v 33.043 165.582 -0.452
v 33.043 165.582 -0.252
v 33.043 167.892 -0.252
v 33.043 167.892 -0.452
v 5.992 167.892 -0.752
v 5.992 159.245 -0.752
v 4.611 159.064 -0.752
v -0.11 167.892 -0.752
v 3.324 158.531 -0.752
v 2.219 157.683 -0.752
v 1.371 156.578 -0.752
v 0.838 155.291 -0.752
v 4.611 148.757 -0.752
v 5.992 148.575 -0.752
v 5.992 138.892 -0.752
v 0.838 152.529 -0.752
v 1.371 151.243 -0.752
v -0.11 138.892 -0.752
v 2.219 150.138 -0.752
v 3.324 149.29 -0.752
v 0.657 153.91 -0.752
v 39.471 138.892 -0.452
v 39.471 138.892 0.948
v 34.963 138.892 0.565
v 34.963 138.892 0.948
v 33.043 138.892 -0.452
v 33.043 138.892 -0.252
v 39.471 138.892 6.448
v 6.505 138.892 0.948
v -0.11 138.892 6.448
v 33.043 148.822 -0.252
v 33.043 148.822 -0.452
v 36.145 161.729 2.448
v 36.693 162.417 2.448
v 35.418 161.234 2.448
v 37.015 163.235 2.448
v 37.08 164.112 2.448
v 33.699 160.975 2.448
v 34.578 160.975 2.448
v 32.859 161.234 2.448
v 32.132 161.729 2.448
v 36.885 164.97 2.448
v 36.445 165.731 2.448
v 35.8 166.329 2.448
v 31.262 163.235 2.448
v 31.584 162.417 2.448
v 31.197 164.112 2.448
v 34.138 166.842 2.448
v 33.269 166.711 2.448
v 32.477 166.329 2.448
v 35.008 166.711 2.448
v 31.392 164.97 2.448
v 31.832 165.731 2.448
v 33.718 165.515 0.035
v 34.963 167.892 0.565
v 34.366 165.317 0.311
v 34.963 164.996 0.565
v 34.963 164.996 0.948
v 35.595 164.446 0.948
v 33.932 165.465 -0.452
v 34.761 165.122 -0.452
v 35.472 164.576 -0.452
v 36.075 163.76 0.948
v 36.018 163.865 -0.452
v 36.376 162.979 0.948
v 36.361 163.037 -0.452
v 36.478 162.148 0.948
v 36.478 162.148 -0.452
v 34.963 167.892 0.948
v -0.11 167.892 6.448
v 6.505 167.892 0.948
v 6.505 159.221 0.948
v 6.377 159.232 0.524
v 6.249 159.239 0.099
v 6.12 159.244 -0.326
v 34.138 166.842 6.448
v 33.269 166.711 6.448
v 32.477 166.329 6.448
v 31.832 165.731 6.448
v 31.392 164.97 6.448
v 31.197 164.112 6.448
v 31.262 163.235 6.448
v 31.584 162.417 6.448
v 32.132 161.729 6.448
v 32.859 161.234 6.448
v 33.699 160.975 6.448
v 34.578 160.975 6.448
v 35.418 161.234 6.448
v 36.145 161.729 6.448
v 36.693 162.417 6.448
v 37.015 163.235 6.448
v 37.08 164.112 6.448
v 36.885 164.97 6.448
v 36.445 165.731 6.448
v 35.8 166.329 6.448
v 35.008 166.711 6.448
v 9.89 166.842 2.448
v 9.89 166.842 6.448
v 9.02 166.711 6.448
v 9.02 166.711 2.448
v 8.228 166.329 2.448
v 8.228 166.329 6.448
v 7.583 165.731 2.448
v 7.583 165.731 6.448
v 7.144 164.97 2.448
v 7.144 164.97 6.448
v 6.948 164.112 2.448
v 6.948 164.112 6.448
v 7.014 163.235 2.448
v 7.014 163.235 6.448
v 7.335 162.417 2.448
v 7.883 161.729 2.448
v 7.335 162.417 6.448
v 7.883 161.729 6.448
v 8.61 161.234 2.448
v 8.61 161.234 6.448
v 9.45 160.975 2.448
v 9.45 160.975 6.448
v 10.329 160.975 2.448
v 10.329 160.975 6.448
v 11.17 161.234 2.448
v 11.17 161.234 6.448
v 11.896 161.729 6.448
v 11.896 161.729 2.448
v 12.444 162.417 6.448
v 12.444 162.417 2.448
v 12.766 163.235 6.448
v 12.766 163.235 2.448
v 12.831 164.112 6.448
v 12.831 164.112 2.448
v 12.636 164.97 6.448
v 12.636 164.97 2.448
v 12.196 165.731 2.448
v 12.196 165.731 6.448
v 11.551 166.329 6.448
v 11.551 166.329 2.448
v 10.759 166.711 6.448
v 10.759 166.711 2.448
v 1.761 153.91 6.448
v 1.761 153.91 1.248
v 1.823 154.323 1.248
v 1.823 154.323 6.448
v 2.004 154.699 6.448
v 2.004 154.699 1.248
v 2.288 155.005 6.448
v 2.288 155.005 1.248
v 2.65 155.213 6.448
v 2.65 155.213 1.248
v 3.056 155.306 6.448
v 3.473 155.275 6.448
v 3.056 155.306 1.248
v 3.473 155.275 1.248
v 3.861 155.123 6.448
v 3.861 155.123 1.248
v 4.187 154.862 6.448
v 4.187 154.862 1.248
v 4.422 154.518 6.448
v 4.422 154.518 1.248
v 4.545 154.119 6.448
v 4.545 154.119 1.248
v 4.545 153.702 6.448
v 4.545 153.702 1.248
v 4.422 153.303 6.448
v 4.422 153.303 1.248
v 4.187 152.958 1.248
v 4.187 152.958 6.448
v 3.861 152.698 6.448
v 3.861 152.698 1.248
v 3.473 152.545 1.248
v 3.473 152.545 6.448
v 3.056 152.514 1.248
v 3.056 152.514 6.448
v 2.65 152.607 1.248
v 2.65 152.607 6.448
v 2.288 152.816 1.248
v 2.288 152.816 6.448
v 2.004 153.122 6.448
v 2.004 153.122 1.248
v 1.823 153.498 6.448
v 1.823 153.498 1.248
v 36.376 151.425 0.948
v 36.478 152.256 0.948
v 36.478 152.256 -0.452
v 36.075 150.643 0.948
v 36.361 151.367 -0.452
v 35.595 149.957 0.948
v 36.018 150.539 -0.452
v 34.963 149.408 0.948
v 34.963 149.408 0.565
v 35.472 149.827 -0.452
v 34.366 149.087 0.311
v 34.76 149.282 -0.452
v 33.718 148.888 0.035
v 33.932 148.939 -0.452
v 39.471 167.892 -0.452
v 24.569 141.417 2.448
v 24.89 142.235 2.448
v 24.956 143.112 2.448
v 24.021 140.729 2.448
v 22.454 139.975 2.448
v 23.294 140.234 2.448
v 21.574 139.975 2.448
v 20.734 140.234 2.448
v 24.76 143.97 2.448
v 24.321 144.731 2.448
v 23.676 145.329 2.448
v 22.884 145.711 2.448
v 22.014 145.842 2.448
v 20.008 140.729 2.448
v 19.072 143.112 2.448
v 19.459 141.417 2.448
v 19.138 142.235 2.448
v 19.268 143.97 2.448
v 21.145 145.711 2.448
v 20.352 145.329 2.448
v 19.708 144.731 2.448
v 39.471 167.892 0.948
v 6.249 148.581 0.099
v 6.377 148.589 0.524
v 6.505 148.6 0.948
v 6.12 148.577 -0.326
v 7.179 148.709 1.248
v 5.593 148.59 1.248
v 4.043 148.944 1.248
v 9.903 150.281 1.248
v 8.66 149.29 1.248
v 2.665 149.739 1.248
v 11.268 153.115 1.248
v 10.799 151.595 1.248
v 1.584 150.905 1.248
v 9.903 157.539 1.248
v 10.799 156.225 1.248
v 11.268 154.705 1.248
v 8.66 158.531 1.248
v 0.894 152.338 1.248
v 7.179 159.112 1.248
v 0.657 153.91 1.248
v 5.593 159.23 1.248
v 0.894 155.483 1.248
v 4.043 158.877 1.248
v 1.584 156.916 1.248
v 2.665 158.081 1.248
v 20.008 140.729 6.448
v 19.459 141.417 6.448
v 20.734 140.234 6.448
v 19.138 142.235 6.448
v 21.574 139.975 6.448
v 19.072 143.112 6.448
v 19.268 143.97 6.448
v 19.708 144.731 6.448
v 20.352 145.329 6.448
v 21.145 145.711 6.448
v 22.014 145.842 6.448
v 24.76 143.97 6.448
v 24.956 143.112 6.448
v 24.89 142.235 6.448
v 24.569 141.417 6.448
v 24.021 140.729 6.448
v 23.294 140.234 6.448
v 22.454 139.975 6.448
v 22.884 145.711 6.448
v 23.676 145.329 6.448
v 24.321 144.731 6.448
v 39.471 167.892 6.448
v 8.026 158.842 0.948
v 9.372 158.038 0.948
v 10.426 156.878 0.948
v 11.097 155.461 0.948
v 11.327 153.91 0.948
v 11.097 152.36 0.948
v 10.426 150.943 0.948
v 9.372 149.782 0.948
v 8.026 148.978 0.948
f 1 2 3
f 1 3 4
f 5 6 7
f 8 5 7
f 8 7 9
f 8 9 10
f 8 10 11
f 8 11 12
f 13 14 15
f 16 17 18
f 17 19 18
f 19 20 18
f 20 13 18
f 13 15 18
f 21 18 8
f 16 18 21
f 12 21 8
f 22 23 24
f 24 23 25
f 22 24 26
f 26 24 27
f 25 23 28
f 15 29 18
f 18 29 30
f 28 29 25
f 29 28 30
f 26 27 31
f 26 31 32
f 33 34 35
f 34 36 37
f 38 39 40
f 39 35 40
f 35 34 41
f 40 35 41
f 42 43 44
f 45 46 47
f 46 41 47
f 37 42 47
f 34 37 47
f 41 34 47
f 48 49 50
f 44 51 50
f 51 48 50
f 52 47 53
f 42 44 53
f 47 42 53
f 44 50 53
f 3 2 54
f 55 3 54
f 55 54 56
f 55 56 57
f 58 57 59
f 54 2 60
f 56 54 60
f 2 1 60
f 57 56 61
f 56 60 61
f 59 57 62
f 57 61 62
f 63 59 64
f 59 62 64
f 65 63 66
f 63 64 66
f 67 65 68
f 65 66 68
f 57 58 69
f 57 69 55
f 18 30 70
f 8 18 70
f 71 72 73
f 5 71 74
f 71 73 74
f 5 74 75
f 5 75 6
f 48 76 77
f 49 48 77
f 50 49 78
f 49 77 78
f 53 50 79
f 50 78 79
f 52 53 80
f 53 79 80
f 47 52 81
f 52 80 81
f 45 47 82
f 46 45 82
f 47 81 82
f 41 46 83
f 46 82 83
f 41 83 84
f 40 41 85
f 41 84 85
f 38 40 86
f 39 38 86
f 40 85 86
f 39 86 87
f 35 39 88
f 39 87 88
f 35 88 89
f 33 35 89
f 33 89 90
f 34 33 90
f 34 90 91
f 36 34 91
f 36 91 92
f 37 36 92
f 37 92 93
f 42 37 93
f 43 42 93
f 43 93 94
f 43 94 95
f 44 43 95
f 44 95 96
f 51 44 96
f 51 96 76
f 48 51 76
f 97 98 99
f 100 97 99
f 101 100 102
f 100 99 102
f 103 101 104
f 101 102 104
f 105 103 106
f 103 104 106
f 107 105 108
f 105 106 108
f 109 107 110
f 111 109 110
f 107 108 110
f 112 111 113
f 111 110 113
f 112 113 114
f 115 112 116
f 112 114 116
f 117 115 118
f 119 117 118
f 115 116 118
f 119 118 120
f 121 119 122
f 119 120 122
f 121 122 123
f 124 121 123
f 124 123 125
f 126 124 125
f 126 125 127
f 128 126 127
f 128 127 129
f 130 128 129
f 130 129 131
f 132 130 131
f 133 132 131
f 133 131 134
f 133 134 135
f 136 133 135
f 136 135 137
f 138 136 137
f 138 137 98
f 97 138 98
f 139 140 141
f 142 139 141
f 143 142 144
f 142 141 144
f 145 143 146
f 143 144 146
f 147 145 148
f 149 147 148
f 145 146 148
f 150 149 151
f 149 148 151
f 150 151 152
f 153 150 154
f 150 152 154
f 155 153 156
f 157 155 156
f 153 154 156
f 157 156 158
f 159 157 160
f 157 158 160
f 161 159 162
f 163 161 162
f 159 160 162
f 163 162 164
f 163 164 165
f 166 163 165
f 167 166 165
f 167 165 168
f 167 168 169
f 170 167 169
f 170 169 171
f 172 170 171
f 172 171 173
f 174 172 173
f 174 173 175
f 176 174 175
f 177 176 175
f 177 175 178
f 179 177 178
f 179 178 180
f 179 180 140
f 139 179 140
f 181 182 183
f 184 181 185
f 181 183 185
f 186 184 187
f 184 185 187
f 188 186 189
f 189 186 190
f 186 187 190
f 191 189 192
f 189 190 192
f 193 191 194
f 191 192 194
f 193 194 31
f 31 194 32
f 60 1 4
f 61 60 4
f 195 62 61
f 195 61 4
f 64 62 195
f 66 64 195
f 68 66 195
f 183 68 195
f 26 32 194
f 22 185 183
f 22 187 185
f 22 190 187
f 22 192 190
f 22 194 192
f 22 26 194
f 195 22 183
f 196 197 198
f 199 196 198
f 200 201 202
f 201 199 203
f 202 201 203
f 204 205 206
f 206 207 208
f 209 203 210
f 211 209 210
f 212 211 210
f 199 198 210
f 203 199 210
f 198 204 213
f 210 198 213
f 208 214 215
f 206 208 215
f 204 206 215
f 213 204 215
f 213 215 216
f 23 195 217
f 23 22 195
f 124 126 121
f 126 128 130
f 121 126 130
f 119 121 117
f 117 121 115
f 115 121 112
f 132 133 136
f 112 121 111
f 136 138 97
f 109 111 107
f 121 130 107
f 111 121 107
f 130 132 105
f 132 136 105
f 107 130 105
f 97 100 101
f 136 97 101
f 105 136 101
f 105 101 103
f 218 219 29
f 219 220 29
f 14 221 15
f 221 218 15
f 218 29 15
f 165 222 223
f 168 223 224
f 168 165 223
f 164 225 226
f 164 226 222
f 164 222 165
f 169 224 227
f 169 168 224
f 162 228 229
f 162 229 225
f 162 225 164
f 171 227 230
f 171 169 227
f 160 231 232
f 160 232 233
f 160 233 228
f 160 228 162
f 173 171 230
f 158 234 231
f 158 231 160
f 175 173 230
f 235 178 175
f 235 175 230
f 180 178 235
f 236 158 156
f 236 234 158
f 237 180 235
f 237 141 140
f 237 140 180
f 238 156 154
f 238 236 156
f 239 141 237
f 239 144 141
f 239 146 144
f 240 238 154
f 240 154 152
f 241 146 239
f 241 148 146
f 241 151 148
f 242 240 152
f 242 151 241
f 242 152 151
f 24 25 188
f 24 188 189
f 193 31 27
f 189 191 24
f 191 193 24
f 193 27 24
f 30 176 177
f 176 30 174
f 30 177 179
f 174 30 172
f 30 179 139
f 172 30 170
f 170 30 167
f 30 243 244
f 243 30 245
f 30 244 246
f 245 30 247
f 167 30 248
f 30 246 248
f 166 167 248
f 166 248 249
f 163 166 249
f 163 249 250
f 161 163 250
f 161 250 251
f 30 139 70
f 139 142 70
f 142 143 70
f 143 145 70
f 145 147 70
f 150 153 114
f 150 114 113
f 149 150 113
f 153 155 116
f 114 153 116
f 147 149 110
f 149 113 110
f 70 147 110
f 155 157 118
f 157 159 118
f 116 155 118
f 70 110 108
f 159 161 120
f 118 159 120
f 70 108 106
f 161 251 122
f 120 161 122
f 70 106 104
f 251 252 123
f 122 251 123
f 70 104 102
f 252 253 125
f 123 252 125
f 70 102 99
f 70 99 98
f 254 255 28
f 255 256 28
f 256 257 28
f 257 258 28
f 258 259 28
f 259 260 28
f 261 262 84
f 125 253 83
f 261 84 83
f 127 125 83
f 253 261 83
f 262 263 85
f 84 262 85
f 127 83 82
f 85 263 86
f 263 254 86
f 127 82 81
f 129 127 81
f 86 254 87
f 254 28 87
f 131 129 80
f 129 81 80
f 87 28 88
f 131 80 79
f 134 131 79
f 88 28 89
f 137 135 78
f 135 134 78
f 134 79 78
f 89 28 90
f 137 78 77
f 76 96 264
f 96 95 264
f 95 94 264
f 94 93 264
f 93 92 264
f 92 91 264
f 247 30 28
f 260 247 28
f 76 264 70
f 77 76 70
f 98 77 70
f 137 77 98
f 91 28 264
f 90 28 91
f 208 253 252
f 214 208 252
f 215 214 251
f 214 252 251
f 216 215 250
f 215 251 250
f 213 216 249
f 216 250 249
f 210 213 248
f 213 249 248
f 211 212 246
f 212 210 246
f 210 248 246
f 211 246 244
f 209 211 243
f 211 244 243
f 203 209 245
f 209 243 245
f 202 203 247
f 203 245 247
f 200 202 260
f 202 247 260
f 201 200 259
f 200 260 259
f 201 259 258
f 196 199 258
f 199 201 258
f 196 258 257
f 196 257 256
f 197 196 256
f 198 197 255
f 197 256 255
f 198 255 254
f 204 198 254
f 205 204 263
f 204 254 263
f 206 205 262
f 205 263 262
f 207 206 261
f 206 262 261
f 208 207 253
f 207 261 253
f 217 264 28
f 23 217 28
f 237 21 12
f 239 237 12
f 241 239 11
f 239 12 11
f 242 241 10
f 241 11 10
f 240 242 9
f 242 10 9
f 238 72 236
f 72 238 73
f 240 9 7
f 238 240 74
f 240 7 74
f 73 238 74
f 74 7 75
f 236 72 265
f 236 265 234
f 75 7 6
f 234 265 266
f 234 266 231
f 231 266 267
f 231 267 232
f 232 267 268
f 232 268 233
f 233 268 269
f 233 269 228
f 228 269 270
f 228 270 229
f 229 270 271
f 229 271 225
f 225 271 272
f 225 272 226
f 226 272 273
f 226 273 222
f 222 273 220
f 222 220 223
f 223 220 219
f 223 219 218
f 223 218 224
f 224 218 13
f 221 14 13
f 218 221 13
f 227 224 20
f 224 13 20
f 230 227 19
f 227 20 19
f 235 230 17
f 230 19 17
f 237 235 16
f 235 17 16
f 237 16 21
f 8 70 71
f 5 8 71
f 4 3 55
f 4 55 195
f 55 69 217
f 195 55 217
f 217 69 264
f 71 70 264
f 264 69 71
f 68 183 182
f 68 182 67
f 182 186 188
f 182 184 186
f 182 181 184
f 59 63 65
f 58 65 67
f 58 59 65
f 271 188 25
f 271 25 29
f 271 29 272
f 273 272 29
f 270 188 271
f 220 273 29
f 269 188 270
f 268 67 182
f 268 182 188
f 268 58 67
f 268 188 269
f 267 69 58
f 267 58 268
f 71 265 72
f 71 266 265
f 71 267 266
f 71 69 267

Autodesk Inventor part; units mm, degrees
ref_plane "YZ Plane" through (0, 0, 0) normal (1, 0, 0) x (0, 1, 0)
ref_plane "XZ Plane" through (0, 0, 0) normal (0, 1, 0) x (-1, 0, 0)
ref_plane "XY Plane" through (0, 0, 0) normal (0, 0, 1) x (1, 0, 0)
ref_plane "Work Plane1" through (52.5141, 202.7033, 6.4479) normal (0, 0, -1) x (0, 1, 0)
sketch "Sketch1" plane through (52.5141, 202.7033, 6.4479) normal (0, 0, -1) x (0, 1, 0)
  circle A0 centre (-59.8114, -30.5) radius 1.4 construction
  circle A1 centre (-38.8114, -18.3756) radius 1.4 projected
  circle A2 centre (-38.8114, -42.6244) radius 1.4 construction
  circle A3 centre (41, 0) radius 1.65 projected
  circle A4 centre (-9, 0) radius 1.65 projected
  circle A5 centre (-9, 50) radius 1.65 projected
  circle A6 centre (41, 50) radius 1.65 projected
  circle A7 centre (16, 50) radius 1.65 projected
  circle A8 centre (-9, 25) radius 1.65 projected
  circle A9 centre (16, 0) radius 1.65 projected
  circle A10 centre (41, 25) radius 1.65 projected
  line L0 (80, 55) -> (-80, 55) projected
  line L1 (-80, 55) -> (-80, -55) projected
  line L2 (-80, -55) -> (80, -55) projected
  line L3 (80, -55) -> (80, 55) projected
  line L4 (-36.5, 0) -> (-36.5, -50) projected
  line L5 (-14, 0) -> (-36.5, 0) projected
  line L6 (-14, -5) -> (-14, 0) projected
  line L7 (72, -5) -> (-14, -5) projected
  line L8 (72, -50) -> (72, -5) projected
  line L9 (-36.5, -50) -> (72, -50) projected
  line L10 (-4, 45) -> (-4, 5) projected
  line L11 (36, 45) -> (-4, 45) projected
  line L12 (36, 5) -> (36, 45) projected
  line L13 (-4, 5) -> (36, 5) projected
  line L14 (-64.5989, -17.0433) -> (-64.5989, -57.0433) construction
  line L15 (-64.5989, -57.0433) -> (-34.5989, -57.0433) construction
  line L16 (-34.5989, -57.0433) -> (-34.5989, -17.0433) construction
  line L17 (-34.5989, -17.0433) -> (-64.5989, -17.0433) construction
  line L18 (-34.8114, -13.0433) -> (-63.8114, -13.0433)
  line L19 (-63.8114, -13.0433) -> (-63.8114, -52.6244)
  line L20 (-63.8114, -52.6244) -> (-34.8114, -52.6244)
  line L21 (-34.8114, -52.6244) -> (-34.8114, -13.0433)
  circle A11 centre (-59.8114, -30.5) radius 2.95
  circle A12 centre (-38.8114, -18.3756) radius 2.95
  circle A13 centre (-38.8114, -42.6244) radius 2.95 construction
  line L22 (-36.5, -35.1157) -> (-41.75, -35.1157) construction
  line L23 (-41.75, -35.1157) -> (-41.75, -38.5657) construction
  line L24 (-41.75, -38.5657) -> (-56.86, -38.5657) construction
  line L25 (-56.86, -38.5657) -> (-56.86, -35.1157) construction
  line L26 (-56.86, -35.1157) -> (-60.26, -35.1157) construction
  line L27 (-60.26, -35.1157) -> (-60.26, -52.0657) construction
  line L28 (-60.26, -52.0657) -> (-36.5, -52.0657) construction
  line L29 (-36.5, -52.0657) -> (-36.5, -35.1157) construction
  line L30 (-41.75, -28.3657) -> (-36.5, -28.3657) construction
  line L31 (-36.5, -28.3657) -> (-36.5, -25.0657) construction
  line L32 (-36.5, -25.0657) -> (-60.26, -25.0657) construction
  line L33 (-60.26, -25.0657) -> (-60.26, -28.3657) construction
  line L34 (-60.26, -28.3657) -> (-56.86, -28.3657) construction
  line L35 (-56.86, -28.3657) -> (-56.86, -27.0942) construction
  line L36 (-56.86, -27.0942) -> (-41.75, -27.0942) construction
  line L37 (-41.75, -27.0942) -> (-41.75, -28.3657) construction
  line L38 (-56.86, -35.1157) -> (-60.26, -35.1157) construction
  line L39 (-56.86, -38.5657) -> (-56.86, -35.1157) construction
  line L40 (-41.75, -38.5657) -> (-56.86, -38.5657) construction
  line L41 (-41.75, -35.1157) -> (-41.75, -38.5657) construction
  line L42 (-36.5, -35.1157) -> (-41.75, -35.1157) construction
  line L43 (-36.5, -35.05) -> (-36.5, -35.1157) construction
  line L44 (-36.5, -35.05) -> (-56.86, -35.05) construction
  line L45 (-36.5, -34.78) -> (-36.5, -35.05) construction
  line L46 (-36.5, -34.78) -> (-56.86, -34.78) construction
  line L47 (-36.5, -34.51) -> (-36.5, -34.78) construction
  line L48 (-36.5, -34.51) -> (-56.86, -34.51) construction
  line L49 (-36.5, -34.24) -> (-36.5, -34.51) construction
  line L50 (-36.5, -34.24) -> (-56.86, -34.24) construction
  line L51 (-36.5, -33.97) -> (-36.5, -34.24) construction
  line L52 (-36.5, -33.97) -> (-56.86, -33.97) construction
  line L53 (-36.5, -33.7) -> (-36.5, -33.97) construction
  line L54 (-36.5, -33.7) -> (-56.86, -33.7) construction
  line L55 (-36.5, -33.43) -> (-36.5, -33.7) construction
  line L56 (-36.5, -33.43) -> (-56.86, -33.43) construction
  line L57 (-36.5, -33.16) -> (-36.5, -33.43) construction
  line L58 (-36.5, -33.16) -> (-56.86, -33.16) construction
  line L59 (-36.5, -32.89) -> (-36.5, -33.16) construction
  line L60 (-36.5, -32.89) -> (-56.86, -32.89) construction
  line L61 (-36.5, -32.62) -> (-36.5, -32.89) construction
  line L62 (-36.5, -32.62) -> (-56.86, -32.62) construction
  line L63 (-36.5, -32.35) -> (-36.5, -32.62) construction
  line L64 (-36.5, -32.35) -> (-56.86, -32.35) construction
  line L65 (-36.5, -32.08) -> (-36.5, -32.35) construction
  line L66 (-36.5, -32.08) -> (-56.86, -32.08) construction
  line L67 (-36.5, -31.81) -> (-36.5, -32.08) construction
  line L68 (-36.5, -31.81) -> (-56.86, -31.81) construction
  line L69 (-36.5, -31.54) -> (-36.5, -31.81) construction
  line L70 (-36.5, -31.54) -> (-56.86, -31.54) construction
  line L71 (-36.5, -31.27) -> (-36.5, -31.54) construction
  line L72 (-36.5, -31.27) -> (-56.86, -31.27) construction
  line L73 (-36.5, -31) -> (-36.5, -31.27) construction
  line L74 (-36.5, -31) -> (-56.86, -31) construction
  line L75 (-36.5, -30.73) -> (-36.5, -31) construction
  line L76 (-36.5, -30.73) -> (-56.86, -30.73) construction
  line L77 (-36.5, -30.46) -> (-36.5, -30.73) construction
  line L78 (-36.5, -30.46) -> (-56.86, -30.46) construction
  line L79 (-36.5, -30.19) -> (-36.5, -30.46) construction
  line L80 (-36.5, -30.19) -> (-56.86, -30.19) construction
  line L81 (-36.5, -29.92) -> (-36.5, -30.19) construction
  line L82 (-36.5, -29.92) -> (-56.86, -29.92) construction
  line L83 (-36.5, -29.65) -> (-36.5, -29.92) construction
  line L84 (-36.5, -29.65) -> (-56.86, -29.65) construction
  line L85 (-36.5, -29.38) -> (-36.5, -29.65) construction
  line L86 (-36.5, -29.38) -> (-56.86, -29.38) construction
  line L87 (-36.5, -29.11) -> (-36.5, -29.38) construction
  line L88 (-36.5, -29.11) -> (-56.86, -29.11) construction
  line L89 (-36.5, -28.84) -> (-36.5, -29.11) construction
  line L90 (-36.5, -28.84) -> (-56.86, -28.84) construction
  line L91 (-36.5, -28.3657) -> (-36.5, -28.84) construction
  line L92 (-41.75, -28.3657) -> (-36.5, -28.3657) construction
  line L93 (-41.75, -27.0942) -> (-41.75, -28.3657) construction
  line L94 (-56.86, -27.0942) -> (-41.75, -27.0942) construction
  line L95 (-56.86, -28.3657) -> (-56.86, -27.0942) construction
  line L96 (-60.26, -28.3657) -> (-56.86, -28.3657) construction
  line L97 (-60.26, -35.1157) -> (-60.26, -28.3657) construction
  line L98 (-60.26, -25.0657) -> (-36.5, -25.0657) construction
  line L99 (-36.5, -25.0657) -> (-36.5, -52.0657) construction
  line L100 (-60.26, -52.0657) -> (-60.26, -25.0657) construction
  line L101 (-57.1632, -22.5233) -> (-33.4032, -22.5233) construction
  line L102 (-33.4032, -22.5233) -> (-33.4032, -49.5233) construction
  line L103 (-33.4032, -49.5233) -> (-57.1632, -49.5233) construction
  line L104 (-57.1632, -49.5233) -> (-57.1632, -22.5233) construction
  circle A14 centre (-38.8114, -42.6244) radius 2.95
  point P0 (-202.7033, -52.5141)
  point P1 (-56.7146, -27.9576)
  dimension "d0" = 4
  dimension "d2" = 4
  dimension "d3" = 4
  dimension "d4" = 5.9
  dimension "d5" = 5.9
  dimension "d6" = 5.9
  dimension "d10" = 10
  dimension "d35" = 24.2487
  dimension "d36" = 12.1244
extrude "Extrusion1" add sketch "Sketch1" along normal blind 4 contours L18 L21 L9 L4 A14 A12 | L4 A12 A14 L9 L21 L20 L19 L18
sketch "Sketch2" plane through (52.5141, 202.7033, 2.4479) normal (0, 0, -1) x (-1, 0, 0)
  circle A0 centre (42.6244, -38.8114) radius 2.95 projected
  circle A1 centre (18.3756, -38.8114) radius 2.95 projected
  circle A2 centre (30.5, -59.8114) radius 2.95 projected
  line L0 (13.0433, -34.8114) -> (13.0433, -63.8114) projected
  line L1 (13.0433, -63.8114) -> (52.6244, -63.8114) projected
  line L2 (52.6244, -63.8114) -> (52.6244, -34.8114) projected
  line L3 (52.6244, -34.8114) -> (13.0433, -34.8114) projected
  point P0 (52.5141, -202.7033)
extrude "Extrusion2" add sketch "Sketch2" along normal blind 1.5 contours A0 | A1 | A2 | L3 L2 L1 L0
sketch "Sketch3" plane through (-0.1103, 138.8919, 6.4479) normal (0, -1, 0) x (1, 0, 0)
  line L0 (39.581, 0) -> (0, 0) projected
  line L1 (0, 0) -> (0, -5.5) projected
  line L2 (39.581, -5.5) -> (0, -5.5) projected
  line L3 (39.581, 0) -> (39.581, -5.5) projected
  line L4 (17.5087, -7.4479) -> (17.5087, -6.8479) construction
  line L5 (17.5087, -6.8479) -> (24.2587, -6.8479) construction
  line L6 (24.2587, -6.8479) -> (24.2587, -7.4479) construction
  line L7 (27.5587, -7.4479) -> (24.2587, -7.4479) construction
  line L8 (27.5587, -6.4479) -> (27.5587, -7.4479) construction
  line L9 (27.5587, -6.4479) -> (0.5587, -6.4479) construction
  line L10 (0.5587, -6.4479) -> (0.5587, -7.4479) construction
  line L11 (17.5087, -7.4479) -> (0.5587, -7.4479) construction
  line L12 (33.581, -5.5) -> (6.581, -5.5)
  line L13 (6.581, -5.5) -> (6.581, -6.5)
  line L14 (6.581, -6.5) -> (33.581, -6.5)
  line L15 (33.581, -6.5) -> (33.581, -5.5)
  line L16 (39.581, 0) -> (39.581, -5.5) projected
  line L17 (39.581, -5.5) -> (35.0732, -5.5)
  line L18 (35.0732, -5.5) -> (35.0732, -6.7)
  line L19 (35.0732, -6.7) -> (39.581, -6.7)
  line L20 (39.581, -6.7) -> (39.581, -5.5)
  line L21 (0, 0) -> (0, -5.5) projected
  line L22 (0, -5.5) -> (6.181, -5.5)
  line L23 (0, -7.2) -> (0, -5.5)
  line L24 (39.581, -6.7) -> (33.1536, -6.7)
  line L25 (33.1536, -6.7) -> (33.1536, -6.9)
  line L26 (33.1536, -6.9) -> (39.581, -6.9)
  line L27 (39.581, -6.9) -> (39.581, -6.7)
  line L28 (33.1536, -6.7) -> (35.0732, -5.8828)
  line L29 (0, -5.5) -> (39.581, -5.5) projected
  line L30 (6.6149, -5.5) -> (6.1022, -7.2)
  line L31 (6.1022, -7.2) -> (0, -7.2)
  dimension "d13" = 27
  dimension "d14" = 1
  dimension "d15" = 6
  dimension "d16" = 1.2
  dimension "d19" = 0.2
extrude "Extrusion3" add sketch "Sketch3" against normal up to surface (29 mm away) contours L20 L19 L18 L2 | L2 L13 L30 L31 L23 | L27 L26 L25 L24 L19 | L18 L24 L28 | L2 L30 L13
sketch "Sketch4" plane through (5.9919, 138.8919, -0.7521) normal (0, 0, -1) x (-1, 0, 0)
  line L0 (6.1022, 29) -> (0, 29) projected
  line L1 (0, 0) -> (0, 29) projected
  line L2 (6.1022, 0) -> (0, 0) projected
  line L3 (6.1022, 0) -> (6.1022, 29) projected
  circle A0 centre (0, 15.0183) radius 5.3352
  point P0 (5.9919, -138.8919)
extrude "Extrusion4" cut sketch "Sketch4" against normal blind 2 contours A0 L1 | L1 A0
sketch "Sketch5" plane through (52.5141, 202.7033, 0.9479) normal (0, 0, -1) x (-1, 0, 0)
  arc A0 (46.5221, -54.1283) -> (46.5221, -43.4579) centre (46.5221, -48.7931) ccw projected
  circle A1 centre (49.353, -48.7931) radius 1.4
  point P0 (52.5141, -202.7033)
  dimension "d30" = 2.8
extrude "Extrusion5" cut sketch "Sketch5" against normal through all
sketch "Sketch6" plane through (39.4707, 138.8919, -0.4521) normal (0, 0, -1) x (-1, 0, 0)
  line L0 (6.4274, 29) -> (0, 29) projected
  line L1 (0, 0) -> (0, 29) projected
  line L2 (6.4274, 0) -> (0, 0) projected
  line L3 (6.4274, 0) -> (6.4274, 29) projected
  arc A0 (33.4788, 9.6831) -> (33.4788, 20.3535) centre (33.4788, 15.0183) ccw projected
  line L4 (6.4274, 26.6901) -> (6.4274, 9.9295) construction
  line L5 (9.8619, 23.2557) -> (9.8619, 13.364)
  line L6 (2.993, 13.364) -> (2.993, 23.2557)
  arc A1 (9.8619, 23.2557) -> (2.993, 23.2557) centre (6.4274, 23.2557) ccw
  arc A2 (2.993, 13.364) -> (9.8619, 13.364) centre (6.4274, 13.364) ccw
  point P0 (39.4707, -138.8919)
  point P1 (6.4274, 18.3098)
extrude "Extrusion6" cut sketch "Sketch6" against normal up to surface (1.4 mm away) contours A1 L5 A2 L3 | L3 A2 L6 A1
equation "\"d31\" = d30"
properties part number "00_cellSTORM_v5_chiptray_old_0"
